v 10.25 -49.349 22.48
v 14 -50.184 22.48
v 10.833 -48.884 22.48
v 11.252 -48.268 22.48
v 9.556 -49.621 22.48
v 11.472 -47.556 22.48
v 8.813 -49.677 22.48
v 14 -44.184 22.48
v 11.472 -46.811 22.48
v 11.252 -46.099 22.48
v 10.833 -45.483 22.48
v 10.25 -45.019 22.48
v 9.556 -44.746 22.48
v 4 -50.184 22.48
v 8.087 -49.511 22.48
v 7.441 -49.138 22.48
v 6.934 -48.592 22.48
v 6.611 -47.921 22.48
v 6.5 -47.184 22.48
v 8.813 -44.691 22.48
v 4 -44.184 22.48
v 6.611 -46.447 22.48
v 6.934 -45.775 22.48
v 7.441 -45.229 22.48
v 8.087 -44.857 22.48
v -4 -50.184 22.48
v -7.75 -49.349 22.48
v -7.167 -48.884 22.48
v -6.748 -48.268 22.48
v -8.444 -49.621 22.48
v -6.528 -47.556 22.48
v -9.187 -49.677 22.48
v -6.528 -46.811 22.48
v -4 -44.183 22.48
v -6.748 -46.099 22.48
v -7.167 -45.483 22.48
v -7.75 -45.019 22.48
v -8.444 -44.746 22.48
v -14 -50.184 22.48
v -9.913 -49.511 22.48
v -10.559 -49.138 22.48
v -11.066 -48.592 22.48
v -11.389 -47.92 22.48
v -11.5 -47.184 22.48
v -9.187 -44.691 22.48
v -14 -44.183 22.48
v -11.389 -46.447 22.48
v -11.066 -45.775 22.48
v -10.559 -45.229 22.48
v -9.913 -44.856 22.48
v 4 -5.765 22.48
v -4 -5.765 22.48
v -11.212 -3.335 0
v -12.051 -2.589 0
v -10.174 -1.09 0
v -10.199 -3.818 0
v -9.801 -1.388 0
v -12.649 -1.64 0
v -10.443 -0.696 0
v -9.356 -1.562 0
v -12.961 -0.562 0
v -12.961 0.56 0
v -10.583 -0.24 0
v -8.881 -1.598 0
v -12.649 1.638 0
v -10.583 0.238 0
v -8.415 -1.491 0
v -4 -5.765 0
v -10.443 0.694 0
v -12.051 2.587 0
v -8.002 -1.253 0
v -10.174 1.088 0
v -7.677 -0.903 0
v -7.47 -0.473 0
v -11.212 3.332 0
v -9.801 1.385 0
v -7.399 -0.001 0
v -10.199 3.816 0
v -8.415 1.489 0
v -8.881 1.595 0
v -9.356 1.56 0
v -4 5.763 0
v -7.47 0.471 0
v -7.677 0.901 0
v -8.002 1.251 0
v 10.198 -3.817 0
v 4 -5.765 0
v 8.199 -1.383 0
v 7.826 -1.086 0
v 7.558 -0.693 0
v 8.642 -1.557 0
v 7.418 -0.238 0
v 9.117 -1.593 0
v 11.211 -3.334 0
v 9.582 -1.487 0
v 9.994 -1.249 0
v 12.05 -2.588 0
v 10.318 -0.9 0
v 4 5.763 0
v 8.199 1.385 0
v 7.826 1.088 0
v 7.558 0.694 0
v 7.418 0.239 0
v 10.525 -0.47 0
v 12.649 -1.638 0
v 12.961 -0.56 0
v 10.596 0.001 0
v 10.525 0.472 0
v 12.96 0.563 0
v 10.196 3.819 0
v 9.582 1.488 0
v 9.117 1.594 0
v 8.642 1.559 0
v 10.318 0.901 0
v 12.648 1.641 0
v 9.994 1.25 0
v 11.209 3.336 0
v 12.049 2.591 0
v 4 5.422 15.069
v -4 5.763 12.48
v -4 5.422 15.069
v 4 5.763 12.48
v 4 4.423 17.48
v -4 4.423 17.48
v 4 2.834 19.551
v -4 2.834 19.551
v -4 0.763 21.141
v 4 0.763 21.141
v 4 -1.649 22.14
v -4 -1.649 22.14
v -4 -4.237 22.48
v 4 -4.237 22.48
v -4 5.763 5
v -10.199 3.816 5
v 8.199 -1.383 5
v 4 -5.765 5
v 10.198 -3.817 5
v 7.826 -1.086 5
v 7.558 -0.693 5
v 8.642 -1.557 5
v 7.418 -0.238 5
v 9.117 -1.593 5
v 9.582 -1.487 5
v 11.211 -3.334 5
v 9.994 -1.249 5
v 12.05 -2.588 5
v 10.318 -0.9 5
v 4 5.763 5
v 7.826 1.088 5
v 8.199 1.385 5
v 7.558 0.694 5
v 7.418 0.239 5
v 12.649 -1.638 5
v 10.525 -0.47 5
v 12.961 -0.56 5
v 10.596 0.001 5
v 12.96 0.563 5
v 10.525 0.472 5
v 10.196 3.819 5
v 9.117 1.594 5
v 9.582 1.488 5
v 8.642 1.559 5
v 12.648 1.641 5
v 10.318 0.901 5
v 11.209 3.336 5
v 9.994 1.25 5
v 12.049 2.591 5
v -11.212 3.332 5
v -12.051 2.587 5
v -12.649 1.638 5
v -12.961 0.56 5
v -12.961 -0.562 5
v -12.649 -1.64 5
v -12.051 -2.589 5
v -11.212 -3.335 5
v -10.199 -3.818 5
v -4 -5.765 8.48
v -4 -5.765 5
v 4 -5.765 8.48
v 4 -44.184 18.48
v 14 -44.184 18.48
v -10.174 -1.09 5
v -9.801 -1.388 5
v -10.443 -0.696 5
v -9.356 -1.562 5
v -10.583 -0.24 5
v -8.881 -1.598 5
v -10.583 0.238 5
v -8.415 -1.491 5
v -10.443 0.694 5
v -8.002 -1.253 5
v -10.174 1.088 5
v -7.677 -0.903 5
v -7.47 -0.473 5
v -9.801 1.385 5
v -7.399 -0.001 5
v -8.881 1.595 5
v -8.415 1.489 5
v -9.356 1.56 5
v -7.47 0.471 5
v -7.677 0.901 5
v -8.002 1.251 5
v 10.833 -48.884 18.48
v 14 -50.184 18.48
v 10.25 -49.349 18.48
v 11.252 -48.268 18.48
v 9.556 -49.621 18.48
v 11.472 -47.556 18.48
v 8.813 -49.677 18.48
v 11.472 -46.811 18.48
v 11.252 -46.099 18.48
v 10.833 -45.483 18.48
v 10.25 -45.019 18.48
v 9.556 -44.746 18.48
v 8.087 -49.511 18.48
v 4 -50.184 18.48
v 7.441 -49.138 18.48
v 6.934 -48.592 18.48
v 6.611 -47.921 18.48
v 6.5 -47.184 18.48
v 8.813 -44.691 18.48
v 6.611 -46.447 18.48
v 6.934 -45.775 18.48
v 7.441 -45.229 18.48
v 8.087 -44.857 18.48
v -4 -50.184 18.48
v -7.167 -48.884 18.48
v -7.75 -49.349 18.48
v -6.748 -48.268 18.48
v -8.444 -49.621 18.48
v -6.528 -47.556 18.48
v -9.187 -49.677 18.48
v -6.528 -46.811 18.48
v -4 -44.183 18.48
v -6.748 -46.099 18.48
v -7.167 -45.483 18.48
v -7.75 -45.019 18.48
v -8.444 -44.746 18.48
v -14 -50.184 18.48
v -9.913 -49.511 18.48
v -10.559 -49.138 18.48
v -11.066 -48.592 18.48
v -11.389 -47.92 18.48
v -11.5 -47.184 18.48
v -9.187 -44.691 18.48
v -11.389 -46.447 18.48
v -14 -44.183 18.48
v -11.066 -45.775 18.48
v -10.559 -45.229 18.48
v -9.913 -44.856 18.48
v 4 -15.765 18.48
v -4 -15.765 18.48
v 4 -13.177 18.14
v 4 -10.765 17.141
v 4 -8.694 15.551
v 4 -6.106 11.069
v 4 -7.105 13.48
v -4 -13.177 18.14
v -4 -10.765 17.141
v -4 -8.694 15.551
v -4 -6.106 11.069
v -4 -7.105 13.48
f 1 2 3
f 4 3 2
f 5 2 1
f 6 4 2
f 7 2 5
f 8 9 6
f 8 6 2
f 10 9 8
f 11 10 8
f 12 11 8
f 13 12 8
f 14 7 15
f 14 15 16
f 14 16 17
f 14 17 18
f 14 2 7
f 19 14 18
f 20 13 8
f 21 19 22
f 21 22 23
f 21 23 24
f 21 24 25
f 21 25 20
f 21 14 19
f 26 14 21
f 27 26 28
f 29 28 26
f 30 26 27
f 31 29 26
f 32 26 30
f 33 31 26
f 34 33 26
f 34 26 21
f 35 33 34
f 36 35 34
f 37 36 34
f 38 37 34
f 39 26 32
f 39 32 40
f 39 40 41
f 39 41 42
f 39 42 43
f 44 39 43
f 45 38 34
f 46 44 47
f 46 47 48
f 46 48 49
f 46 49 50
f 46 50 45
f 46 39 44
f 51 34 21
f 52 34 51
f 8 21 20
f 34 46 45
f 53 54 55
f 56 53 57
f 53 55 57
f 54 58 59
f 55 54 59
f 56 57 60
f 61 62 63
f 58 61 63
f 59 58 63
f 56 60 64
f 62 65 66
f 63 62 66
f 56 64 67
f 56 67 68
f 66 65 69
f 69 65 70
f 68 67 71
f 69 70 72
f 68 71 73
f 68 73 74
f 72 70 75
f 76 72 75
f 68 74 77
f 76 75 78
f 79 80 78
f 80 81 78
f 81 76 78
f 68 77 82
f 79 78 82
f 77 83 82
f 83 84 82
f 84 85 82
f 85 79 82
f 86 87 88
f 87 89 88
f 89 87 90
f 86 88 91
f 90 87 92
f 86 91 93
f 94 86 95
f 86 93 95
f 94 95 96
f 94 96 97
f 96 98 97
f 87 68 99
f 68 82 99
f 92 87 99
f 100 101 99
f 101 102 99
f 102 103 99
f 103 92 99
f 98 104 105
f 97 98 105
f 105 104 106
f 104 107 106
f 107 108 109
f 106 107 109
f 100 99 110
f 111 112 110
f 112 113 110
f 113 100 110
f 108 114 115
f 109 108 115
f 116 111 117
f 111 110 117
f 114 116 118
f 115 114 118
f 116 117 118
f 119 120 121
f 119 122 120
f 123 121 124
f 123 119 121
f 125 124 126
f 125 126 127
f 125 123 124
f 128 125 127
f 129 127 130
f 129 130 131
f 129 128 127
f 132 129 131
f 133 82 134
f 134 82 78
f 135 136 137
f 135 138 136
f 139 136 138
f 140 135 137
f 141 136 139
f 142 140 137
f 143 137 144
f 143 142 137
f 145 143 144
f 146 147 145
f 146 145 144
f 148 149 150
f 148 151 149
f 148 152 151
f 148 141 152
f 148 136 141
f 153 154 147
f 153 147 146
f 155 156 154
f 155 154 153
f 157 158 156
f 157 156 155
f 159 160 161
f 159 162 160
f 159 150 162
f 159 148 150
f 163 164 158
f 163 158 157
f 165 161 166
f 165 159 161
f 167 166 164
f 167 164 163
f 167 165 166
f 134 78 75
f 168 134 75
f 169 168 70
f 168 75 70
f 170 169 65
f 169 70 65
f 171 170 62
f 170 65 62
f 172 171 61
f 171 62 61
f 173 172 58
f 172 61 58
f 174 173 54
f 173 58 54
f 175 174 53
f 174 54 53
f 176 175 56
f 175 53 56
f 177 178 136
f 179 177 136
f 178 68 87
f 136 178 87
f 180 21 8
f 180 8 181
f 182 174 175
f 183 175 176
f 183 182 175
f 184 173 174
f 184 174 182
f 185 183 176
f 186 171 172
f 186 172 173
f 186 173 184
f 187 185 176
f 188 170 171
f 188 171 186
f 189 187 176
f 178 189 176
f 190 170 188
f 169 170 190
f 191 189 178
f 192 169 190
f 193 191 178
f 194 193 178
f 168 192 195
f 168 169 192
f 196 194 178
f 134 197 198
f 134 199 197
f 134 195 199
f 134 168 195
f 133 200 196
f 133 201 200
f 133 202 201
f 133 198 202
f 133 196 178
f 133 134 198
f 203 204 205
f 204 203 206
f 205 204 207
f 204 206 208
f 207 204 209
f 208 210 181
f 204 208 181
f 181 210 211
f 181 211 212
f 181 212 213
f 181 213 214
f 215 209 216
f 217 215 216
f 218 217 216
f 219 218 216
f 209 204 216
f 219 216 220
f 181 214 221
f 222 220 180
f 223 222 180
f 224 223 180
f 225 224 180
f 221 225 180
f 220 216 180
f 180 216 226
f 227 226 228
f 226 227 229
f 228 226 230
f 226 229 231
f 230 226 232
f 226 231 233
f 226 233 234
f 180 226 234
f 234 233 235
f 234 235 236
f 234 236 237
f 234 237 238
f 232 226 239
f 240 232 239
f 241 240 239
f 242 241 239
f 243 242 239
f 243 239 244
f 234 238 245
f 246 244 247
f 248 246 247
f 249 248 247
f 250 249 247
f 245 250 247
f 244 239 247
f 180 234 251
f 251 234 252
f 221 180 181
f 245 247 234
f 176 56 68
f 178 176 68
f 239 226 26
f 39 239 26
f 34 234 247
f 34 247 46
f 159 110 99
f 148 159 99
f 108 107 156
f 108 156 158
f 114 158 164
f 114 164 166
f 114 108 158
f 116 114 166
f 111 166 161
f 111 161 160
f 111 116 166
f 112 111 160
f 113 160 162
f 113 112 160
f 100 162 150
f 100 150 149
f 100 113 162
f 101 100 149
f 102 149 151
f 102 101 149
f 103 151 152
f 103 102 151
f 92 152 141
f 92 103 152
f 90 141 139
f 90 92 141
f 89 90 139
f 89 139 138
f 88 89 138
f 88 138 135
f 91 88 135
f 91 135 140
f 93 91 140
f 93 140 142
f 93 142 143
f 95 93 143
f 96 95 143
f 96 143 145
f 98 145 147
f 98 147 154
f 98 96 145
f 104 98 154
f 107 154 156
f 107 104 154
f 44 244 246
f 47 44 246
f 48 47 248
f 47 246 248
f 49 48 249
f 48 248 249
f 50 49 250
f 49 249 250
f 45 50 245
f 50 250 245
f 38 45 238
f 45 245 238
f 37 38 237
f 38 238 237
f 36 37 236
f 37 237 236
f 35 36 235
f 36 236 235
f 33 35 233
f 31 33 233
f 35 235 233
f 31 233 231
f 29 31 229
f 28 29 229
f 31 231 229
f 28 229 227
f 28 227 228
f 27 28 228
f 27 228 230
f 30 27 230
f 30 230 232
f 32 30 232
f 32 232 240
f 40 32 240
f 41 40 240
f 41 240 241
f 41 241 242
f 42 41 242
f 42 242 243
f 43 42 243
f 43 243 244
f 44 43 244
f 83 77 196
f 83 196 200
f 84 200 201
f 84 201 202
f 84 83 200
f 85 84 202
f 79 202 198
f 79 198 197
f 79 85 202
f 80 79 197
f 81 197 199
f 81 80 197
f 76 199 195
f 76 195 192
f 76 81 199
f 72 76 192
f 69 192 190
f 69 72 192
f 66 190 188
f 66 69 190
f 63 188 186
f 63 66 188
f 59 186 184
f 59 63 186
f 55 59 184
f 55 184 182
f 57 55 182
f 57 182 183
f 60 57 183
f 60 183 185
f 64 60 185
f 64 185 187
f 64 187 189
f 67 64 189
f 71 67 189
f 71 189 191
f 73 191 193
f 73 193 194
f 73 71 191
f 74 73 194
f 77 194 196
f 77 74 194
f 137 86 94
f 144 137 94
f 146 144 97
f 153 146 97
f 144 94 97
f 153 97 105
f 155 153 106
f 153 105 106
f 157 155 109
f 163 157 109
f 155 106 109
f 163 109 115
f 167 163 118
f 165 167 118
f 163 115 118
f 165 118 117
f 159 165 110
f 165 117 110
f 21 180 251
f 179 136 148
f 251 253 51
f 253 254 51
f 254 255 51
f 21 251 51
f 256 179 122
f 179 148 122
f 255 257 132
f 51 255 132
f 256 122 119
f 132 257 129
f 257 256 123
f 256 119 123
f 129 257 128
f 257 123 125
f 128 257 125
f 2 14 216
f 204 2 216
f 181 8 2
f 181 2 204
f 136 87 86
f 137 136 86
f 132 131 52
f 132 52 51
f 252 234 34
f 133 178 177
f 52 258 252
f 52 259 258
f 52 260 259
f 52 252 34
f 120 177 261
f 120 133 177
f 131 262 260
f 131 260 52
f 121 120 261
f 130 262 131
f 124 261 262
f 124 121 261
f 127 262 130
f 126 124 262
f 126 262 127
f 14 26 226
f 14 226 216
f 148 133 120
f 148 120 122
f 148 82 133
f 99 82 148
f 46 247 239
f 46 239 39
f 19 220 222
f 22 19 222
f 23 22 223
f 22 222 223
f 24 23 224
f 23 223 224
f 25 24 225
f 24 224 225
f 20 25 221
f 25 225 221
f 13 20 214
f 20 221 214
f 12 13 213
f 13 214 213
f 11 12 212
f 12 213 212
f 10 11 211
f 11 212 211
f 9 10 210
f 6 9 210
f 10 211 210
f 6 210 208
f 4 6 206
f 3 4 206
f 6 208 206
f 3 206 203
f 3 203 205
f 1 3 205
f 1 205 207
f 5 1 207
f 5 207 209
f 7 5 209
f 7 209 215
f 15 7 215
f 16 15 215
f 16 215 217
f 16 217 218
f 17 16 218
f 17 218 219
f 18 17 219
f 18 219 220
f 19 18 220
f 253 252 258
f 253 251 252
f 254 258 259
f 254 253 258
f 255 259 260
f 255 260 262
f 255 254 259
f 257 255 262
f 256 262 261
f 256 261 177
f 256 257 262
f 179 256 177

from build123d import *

# Parameters (mm, degrees)
ESBO_O1_R                = 1.598160281
ESBO_O1_R_2              = 1.600993429
RESSALTO_EXTRUS_O1_DEPTH = 5
ESBO_O2_W                = 8.00000038
ESBO_O2_H                = 11.528000702
RESSALTO_EXTRUS_O2_DEPTH = 17.480363
ESBO_O3_W                = 8.00000038
ESBO_O3_H                = 4
RESSALTO_EXTRUS_O3_DEPTH = 44.418848
ESBO_O4_W                = 4
ESBO_O4_H                = 6.000686184
RESSALTO_EXTRUS_O4_DEPTH = 10
ESBO_O5_W                = 4
ESBO_O5_H                = 6
RESSALTO_EXTRUS_O5_DEPTH = 10
FILETE1_R                = 10
FILETE2_R                = 10
ESBO_O6_R                = 2.5
CORTE_EXTRUS_O1_DEPTH    = 10


with BuildPart() as part:
    # Esboço1 → Ressalto-extrusão1 (new body)
    with BuildSketch(Plane.XY):
        with BuildLine():
            Line((-10.199065979, -3.817665654), (-4.00000019, -5.764999893))
            Line((-4.00000019, -5.764999893), (4.00000019, -5.764999893))
            Line((4.00000019, -5.764999893), (10.197782, -3.817301838))
            ThreePointArc((10.197782, -3.817301838), (12.999977706, 0.001566069), (10.195969576, 3.8191034))
            Line((10.195969576, 3.8191034), (4.00000019, 5.763000809))
            Line((4.00000019, 5.763000809), (-4.00000019, 5.763000809))
            Line((-4.00000019, 5.763000809), (-10.199143851, 3.815503142))
            ThreePointArc((-10.199143851, 3.815503142), (-13.000622723, -0.001109837), (-10.199065979, -3.817665654))
        make_face()
        with Locations((8.997973452, 0.000616233)):
            Circle(ESBO_O1_R, mode=Mode.SUBTRACT)
        with Locations((-9.000145119, -0.001069025)):
            Circle(ESBO_O1_R_2, mode=Mode.SUBTRACT)
    extrude(amount=RESSALTO_EXTRUS_O1_DEPTH)

    # Esboço2 → Ressalto-extrusão2 (add)
    with BuildSketch(Plane.XY.offset(5)):
        with Locations((0, -0.000999542)):
            Rectangle(ESBO_O2_W, ESBO_O2_H)
    extrude(amount=RESSALTO_EXTRUS_O2_DEPTH)

    # Esboço3 → Ressalto-extrusão3 (add)
    with BuildSketch(Plane.XZ.offset(5.764999893)):
        with Locations((0, 20.480363203)):
            Rectangle(ESBO_O3_W, ESBO_O3_H)
    extrude(amount=RESSALTO_EXTRUS_O3_DEPTH)

    # Esboço4 → Ressalto-extrusão4 (add)
    with BuildSketch(Plane.ZY.offset(4.00000019)):
        with Locations((20.480363203, -47.183504361)):
            Rectangle(ESBO_O4_W, ESBO_O4_H)
    extrude(amount=RESSALTO_EXTRUS_O4_DEPTH)

    # Esboço5 → Ressalto-extrusão5 (add)
    with BuildSketch(Plane(origin=(4.00000019, 0, 0), x_dir=(0, 0, -1), z_dir=(1, 0, 0))):
        with Locations((-20.480363203, -47.183847453)):
            Rectangle(ESBO_O5_W, ESBO_O5_H)
    extrude(amount=RESSALTO_EXTRUS_O5_DEPTH)

    # Filete1
    filete1_edges = [part.edges().sort_by_distance(p)[0] for p in [
        (0, -5.764999893, 18.480363203),
    ]]
    fillet(filete1_edges, radius=FILETE1_R)

    # Filete2
    filete2_edges = [part.edges().sort_by_distance(p)[0] for p in [
        (0, 5.763000809, 22.480363),
    ]]
    fillet(filete2_edges, radius=FILETE2_R)

    # Esboço6 → Corte-extrusão1 (cut)
    with BuildSketch(Plane(origin=(0, 0, 18.480363203), x_dir=(-1, 0, 0), z_dir=(0, 0, -1))):
        with Locations((-9.00000019, -47.183786187)):
            Circle(ESBO_O6_R)
        with Locations((9.00000019, -47.183565627)):
            Circle(ESBO_O6_R)
    extrude(amount=-CORTE_EXTRUS_O1_DEPTH, mode=Mode.SUBTRACT)


solid = part.part
